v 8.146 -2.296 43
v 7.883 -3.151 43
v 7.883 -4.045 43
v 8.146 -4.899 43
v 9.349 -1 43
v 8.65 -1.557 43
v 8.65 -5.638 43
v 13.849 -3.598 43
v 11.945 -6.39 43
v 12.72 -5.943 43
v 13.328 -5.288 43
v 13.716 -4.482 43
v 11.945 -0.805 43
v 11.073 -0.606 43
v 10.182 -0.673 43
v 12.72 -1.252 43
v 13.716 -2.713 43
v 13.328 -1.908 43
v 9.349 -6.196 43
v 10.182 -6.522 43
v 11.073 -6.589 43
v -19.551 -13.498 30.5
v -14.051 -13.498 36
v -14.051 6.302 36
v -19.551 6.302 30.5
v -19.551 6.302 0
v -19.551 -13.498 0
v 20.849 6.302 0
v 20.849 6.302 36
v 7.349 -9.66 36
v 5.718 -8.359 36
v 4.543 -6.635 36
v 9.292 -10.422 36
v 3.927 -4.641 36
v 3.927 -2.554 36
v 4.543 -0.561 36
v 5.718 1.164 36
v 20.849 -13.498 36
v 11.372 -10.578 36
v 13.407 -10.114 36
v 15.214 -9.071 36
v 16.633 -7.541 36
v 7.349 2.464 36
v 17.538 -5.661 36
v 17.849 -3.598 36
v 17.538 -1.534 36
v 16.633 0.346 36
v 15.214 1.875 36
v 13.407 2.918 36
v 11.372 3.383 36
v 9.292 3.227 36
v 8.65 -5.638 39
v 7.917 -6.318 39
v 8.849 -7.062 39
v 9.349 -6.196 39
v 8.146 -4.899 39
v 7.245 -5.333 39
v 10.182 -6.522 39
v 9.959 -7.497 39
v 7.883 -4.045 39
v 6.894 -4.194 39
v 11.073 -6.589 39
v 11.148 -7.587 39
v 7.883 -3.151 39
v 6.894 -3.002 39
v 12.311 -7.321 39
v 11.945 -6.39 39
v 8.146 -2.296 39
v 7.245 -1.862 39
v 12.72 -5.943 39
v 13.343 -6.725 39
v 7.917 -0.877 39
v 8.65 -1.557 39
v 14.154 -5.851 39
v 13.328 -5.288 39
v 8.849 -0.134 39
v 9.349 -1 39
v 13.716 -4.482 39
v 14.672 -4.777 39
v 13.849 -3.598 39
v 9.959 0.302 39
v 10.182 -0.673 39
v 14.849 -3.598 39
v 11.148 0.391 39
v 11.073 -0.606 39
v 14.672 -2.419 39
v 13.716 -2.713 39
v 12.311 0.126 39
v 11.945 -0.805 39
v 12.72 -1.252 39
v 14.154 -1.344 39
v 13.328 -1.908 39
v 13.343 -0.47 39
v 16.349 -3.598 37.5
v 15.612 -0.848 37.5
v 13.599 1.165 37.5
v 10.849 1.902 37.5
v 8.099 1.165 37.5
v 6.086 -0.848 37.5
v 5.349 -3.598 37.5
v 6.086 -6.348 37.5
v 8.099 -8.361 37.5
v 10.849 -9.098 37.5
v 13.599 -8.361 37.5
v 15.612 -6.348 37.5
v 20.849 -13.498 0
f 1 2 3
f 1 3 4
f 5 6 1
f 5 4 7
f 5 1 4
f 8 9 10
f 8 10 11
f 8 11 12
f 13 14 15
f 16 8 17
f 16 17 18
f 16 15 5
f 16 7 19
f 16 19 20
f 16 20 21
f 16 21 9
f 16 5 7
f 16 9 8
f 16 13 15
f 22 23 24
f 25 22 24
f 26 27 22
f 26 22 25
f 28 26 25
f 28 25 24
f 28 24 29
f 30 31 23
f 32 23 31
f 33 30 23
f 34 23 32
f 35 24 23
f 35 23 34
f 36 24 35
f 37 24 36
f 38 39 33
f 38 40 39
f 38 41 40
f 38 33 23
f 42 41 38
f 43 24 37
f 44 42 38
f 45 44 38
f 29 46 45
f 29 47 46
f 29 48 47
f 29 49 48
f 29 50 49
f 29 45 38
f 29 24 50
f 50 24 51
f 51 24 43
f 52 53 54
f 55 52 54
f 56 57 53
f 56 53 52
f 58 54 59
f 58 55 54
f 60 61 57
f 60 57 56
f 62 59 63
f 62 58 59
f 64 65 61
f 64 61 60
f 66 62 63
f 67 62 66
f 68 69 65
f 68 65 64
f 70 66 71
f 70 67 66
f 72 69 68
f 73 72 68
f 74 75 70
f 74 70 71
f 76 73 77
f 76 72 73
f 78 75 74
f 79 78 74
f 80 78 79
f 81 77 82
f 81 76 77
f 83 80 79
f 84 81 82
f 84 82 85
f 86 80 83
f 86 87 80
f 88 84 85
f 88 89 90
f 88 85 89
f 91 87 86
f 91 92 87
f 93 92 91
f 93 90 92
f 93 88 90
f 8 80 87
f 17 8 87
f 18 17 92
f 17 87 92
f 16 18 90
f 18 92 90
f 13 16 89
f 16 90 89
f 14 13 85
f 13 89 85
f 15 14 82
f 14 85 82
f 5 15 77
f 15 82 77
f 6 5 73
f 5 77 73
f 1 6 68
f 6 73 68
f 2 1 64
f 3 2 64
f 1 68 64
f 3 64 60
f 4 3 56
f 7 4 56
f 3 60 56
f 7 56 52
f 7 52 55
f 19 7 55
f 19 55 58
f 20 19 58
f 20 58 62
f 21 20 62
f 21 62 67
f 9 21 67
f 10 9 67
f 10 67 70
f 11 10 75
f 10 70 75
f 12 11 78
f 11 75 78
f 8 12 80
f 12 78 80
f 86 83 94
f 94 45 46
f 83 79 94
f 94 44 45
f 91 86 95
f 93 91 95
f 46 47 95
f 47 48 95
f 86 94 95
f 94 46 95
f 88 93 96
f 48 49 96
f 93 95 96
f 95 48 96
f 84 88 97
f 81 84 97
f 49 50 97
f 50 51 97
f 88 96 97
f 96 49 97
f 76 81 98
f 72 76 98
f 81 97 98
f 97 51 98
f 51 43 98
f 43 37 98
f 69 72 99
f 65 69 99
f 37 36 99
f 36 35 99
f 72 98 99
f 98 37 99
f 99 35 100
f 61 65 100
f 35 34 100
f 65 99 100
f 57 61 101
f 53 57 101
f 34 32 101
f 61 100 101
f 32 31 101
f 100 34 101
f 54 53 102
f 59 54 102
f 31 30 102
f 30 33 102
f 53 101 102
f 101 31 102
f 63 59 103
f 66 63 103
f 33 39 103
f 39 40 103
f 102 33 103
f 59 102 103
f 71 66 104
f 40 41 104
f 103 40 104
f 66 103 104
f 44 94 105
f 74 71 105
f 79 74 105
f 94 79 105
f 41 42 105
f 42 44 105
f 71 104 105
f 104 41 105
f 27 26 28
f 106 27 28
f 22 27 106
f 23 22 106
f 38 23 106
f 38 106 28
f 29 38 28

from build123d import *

# Parameters (mm, degrees)
F0_W     = 40.4
F0_H     = 19.8
F1_DEPTH = 36
F2_SIZE  = 5.5
F3_R     = 7
F3_R_2   = 5
F4_DEPTH = 3
F5_DEPTH = 3
F6_SIZE  = 2.99999
F7_R     = 3
F8_DEPTH = 4


# Not quite as in the source:
# - a fillet or chamfer is up to 0.001 mm smaller than in the source, because OpenCascade refuses the exact size


with BuildPart() as f1:
    # F0 (on Top) → F1 (new body)
    with BuildSketch(Plane.XY):
        with Locations((0.6492929533, -3.5976961023)):
            Rectangle(F0_W, F0_H)
    extrude(amount=F1_DEPTH)

    # F2
    f2_edges = [f1.edges().sort_by_distance(p)[0] for p in [
        (-19.550707, -3.597696, 36),
    ]]
    chamfer(f2_edges, length=F2_SIZE)

    # F3 (on face) → F4 (join)
    with BuildSketch(Plane.XY.offset(36)):
        with Locations((10.8492929533, -3.5976961023)):
            Circle(F3_R)
        with Locations((10.8492929533, -3.5976961023)):
            Circle(F3_R_2, mode=Mode.SUBTRACT)
    extrude(amount=F4_DEPTH)

    # F5 (add): a face of the model
    f5_faces = [f1.faces().sort_by_distance(p)[0] for p in [
        (10.8492929533, -3.5976961023, 36),
    ]]
    extrude(f5_faces, amount=F5_DEPTH)

    # F6 (size 3 in the source; OpenCascade refuses exactly that, so slightly less here)
    f6_edges = [f1.edges().sort_by_distance(p)[0] for p in [
        (3.849293, -3.597696, 39),
    ]]
    chamfer(f6_edges, length=F6_SIZE)

    # F7 (on face) → F8 (join)
    with BuildSketch(Plane.XY.offset(39)):
        with Locations((10.8492929533, -3.5976961023)):
            Circle(F7_R)
    extrude(amount=F8_DEPTH)


solid = f1.part
